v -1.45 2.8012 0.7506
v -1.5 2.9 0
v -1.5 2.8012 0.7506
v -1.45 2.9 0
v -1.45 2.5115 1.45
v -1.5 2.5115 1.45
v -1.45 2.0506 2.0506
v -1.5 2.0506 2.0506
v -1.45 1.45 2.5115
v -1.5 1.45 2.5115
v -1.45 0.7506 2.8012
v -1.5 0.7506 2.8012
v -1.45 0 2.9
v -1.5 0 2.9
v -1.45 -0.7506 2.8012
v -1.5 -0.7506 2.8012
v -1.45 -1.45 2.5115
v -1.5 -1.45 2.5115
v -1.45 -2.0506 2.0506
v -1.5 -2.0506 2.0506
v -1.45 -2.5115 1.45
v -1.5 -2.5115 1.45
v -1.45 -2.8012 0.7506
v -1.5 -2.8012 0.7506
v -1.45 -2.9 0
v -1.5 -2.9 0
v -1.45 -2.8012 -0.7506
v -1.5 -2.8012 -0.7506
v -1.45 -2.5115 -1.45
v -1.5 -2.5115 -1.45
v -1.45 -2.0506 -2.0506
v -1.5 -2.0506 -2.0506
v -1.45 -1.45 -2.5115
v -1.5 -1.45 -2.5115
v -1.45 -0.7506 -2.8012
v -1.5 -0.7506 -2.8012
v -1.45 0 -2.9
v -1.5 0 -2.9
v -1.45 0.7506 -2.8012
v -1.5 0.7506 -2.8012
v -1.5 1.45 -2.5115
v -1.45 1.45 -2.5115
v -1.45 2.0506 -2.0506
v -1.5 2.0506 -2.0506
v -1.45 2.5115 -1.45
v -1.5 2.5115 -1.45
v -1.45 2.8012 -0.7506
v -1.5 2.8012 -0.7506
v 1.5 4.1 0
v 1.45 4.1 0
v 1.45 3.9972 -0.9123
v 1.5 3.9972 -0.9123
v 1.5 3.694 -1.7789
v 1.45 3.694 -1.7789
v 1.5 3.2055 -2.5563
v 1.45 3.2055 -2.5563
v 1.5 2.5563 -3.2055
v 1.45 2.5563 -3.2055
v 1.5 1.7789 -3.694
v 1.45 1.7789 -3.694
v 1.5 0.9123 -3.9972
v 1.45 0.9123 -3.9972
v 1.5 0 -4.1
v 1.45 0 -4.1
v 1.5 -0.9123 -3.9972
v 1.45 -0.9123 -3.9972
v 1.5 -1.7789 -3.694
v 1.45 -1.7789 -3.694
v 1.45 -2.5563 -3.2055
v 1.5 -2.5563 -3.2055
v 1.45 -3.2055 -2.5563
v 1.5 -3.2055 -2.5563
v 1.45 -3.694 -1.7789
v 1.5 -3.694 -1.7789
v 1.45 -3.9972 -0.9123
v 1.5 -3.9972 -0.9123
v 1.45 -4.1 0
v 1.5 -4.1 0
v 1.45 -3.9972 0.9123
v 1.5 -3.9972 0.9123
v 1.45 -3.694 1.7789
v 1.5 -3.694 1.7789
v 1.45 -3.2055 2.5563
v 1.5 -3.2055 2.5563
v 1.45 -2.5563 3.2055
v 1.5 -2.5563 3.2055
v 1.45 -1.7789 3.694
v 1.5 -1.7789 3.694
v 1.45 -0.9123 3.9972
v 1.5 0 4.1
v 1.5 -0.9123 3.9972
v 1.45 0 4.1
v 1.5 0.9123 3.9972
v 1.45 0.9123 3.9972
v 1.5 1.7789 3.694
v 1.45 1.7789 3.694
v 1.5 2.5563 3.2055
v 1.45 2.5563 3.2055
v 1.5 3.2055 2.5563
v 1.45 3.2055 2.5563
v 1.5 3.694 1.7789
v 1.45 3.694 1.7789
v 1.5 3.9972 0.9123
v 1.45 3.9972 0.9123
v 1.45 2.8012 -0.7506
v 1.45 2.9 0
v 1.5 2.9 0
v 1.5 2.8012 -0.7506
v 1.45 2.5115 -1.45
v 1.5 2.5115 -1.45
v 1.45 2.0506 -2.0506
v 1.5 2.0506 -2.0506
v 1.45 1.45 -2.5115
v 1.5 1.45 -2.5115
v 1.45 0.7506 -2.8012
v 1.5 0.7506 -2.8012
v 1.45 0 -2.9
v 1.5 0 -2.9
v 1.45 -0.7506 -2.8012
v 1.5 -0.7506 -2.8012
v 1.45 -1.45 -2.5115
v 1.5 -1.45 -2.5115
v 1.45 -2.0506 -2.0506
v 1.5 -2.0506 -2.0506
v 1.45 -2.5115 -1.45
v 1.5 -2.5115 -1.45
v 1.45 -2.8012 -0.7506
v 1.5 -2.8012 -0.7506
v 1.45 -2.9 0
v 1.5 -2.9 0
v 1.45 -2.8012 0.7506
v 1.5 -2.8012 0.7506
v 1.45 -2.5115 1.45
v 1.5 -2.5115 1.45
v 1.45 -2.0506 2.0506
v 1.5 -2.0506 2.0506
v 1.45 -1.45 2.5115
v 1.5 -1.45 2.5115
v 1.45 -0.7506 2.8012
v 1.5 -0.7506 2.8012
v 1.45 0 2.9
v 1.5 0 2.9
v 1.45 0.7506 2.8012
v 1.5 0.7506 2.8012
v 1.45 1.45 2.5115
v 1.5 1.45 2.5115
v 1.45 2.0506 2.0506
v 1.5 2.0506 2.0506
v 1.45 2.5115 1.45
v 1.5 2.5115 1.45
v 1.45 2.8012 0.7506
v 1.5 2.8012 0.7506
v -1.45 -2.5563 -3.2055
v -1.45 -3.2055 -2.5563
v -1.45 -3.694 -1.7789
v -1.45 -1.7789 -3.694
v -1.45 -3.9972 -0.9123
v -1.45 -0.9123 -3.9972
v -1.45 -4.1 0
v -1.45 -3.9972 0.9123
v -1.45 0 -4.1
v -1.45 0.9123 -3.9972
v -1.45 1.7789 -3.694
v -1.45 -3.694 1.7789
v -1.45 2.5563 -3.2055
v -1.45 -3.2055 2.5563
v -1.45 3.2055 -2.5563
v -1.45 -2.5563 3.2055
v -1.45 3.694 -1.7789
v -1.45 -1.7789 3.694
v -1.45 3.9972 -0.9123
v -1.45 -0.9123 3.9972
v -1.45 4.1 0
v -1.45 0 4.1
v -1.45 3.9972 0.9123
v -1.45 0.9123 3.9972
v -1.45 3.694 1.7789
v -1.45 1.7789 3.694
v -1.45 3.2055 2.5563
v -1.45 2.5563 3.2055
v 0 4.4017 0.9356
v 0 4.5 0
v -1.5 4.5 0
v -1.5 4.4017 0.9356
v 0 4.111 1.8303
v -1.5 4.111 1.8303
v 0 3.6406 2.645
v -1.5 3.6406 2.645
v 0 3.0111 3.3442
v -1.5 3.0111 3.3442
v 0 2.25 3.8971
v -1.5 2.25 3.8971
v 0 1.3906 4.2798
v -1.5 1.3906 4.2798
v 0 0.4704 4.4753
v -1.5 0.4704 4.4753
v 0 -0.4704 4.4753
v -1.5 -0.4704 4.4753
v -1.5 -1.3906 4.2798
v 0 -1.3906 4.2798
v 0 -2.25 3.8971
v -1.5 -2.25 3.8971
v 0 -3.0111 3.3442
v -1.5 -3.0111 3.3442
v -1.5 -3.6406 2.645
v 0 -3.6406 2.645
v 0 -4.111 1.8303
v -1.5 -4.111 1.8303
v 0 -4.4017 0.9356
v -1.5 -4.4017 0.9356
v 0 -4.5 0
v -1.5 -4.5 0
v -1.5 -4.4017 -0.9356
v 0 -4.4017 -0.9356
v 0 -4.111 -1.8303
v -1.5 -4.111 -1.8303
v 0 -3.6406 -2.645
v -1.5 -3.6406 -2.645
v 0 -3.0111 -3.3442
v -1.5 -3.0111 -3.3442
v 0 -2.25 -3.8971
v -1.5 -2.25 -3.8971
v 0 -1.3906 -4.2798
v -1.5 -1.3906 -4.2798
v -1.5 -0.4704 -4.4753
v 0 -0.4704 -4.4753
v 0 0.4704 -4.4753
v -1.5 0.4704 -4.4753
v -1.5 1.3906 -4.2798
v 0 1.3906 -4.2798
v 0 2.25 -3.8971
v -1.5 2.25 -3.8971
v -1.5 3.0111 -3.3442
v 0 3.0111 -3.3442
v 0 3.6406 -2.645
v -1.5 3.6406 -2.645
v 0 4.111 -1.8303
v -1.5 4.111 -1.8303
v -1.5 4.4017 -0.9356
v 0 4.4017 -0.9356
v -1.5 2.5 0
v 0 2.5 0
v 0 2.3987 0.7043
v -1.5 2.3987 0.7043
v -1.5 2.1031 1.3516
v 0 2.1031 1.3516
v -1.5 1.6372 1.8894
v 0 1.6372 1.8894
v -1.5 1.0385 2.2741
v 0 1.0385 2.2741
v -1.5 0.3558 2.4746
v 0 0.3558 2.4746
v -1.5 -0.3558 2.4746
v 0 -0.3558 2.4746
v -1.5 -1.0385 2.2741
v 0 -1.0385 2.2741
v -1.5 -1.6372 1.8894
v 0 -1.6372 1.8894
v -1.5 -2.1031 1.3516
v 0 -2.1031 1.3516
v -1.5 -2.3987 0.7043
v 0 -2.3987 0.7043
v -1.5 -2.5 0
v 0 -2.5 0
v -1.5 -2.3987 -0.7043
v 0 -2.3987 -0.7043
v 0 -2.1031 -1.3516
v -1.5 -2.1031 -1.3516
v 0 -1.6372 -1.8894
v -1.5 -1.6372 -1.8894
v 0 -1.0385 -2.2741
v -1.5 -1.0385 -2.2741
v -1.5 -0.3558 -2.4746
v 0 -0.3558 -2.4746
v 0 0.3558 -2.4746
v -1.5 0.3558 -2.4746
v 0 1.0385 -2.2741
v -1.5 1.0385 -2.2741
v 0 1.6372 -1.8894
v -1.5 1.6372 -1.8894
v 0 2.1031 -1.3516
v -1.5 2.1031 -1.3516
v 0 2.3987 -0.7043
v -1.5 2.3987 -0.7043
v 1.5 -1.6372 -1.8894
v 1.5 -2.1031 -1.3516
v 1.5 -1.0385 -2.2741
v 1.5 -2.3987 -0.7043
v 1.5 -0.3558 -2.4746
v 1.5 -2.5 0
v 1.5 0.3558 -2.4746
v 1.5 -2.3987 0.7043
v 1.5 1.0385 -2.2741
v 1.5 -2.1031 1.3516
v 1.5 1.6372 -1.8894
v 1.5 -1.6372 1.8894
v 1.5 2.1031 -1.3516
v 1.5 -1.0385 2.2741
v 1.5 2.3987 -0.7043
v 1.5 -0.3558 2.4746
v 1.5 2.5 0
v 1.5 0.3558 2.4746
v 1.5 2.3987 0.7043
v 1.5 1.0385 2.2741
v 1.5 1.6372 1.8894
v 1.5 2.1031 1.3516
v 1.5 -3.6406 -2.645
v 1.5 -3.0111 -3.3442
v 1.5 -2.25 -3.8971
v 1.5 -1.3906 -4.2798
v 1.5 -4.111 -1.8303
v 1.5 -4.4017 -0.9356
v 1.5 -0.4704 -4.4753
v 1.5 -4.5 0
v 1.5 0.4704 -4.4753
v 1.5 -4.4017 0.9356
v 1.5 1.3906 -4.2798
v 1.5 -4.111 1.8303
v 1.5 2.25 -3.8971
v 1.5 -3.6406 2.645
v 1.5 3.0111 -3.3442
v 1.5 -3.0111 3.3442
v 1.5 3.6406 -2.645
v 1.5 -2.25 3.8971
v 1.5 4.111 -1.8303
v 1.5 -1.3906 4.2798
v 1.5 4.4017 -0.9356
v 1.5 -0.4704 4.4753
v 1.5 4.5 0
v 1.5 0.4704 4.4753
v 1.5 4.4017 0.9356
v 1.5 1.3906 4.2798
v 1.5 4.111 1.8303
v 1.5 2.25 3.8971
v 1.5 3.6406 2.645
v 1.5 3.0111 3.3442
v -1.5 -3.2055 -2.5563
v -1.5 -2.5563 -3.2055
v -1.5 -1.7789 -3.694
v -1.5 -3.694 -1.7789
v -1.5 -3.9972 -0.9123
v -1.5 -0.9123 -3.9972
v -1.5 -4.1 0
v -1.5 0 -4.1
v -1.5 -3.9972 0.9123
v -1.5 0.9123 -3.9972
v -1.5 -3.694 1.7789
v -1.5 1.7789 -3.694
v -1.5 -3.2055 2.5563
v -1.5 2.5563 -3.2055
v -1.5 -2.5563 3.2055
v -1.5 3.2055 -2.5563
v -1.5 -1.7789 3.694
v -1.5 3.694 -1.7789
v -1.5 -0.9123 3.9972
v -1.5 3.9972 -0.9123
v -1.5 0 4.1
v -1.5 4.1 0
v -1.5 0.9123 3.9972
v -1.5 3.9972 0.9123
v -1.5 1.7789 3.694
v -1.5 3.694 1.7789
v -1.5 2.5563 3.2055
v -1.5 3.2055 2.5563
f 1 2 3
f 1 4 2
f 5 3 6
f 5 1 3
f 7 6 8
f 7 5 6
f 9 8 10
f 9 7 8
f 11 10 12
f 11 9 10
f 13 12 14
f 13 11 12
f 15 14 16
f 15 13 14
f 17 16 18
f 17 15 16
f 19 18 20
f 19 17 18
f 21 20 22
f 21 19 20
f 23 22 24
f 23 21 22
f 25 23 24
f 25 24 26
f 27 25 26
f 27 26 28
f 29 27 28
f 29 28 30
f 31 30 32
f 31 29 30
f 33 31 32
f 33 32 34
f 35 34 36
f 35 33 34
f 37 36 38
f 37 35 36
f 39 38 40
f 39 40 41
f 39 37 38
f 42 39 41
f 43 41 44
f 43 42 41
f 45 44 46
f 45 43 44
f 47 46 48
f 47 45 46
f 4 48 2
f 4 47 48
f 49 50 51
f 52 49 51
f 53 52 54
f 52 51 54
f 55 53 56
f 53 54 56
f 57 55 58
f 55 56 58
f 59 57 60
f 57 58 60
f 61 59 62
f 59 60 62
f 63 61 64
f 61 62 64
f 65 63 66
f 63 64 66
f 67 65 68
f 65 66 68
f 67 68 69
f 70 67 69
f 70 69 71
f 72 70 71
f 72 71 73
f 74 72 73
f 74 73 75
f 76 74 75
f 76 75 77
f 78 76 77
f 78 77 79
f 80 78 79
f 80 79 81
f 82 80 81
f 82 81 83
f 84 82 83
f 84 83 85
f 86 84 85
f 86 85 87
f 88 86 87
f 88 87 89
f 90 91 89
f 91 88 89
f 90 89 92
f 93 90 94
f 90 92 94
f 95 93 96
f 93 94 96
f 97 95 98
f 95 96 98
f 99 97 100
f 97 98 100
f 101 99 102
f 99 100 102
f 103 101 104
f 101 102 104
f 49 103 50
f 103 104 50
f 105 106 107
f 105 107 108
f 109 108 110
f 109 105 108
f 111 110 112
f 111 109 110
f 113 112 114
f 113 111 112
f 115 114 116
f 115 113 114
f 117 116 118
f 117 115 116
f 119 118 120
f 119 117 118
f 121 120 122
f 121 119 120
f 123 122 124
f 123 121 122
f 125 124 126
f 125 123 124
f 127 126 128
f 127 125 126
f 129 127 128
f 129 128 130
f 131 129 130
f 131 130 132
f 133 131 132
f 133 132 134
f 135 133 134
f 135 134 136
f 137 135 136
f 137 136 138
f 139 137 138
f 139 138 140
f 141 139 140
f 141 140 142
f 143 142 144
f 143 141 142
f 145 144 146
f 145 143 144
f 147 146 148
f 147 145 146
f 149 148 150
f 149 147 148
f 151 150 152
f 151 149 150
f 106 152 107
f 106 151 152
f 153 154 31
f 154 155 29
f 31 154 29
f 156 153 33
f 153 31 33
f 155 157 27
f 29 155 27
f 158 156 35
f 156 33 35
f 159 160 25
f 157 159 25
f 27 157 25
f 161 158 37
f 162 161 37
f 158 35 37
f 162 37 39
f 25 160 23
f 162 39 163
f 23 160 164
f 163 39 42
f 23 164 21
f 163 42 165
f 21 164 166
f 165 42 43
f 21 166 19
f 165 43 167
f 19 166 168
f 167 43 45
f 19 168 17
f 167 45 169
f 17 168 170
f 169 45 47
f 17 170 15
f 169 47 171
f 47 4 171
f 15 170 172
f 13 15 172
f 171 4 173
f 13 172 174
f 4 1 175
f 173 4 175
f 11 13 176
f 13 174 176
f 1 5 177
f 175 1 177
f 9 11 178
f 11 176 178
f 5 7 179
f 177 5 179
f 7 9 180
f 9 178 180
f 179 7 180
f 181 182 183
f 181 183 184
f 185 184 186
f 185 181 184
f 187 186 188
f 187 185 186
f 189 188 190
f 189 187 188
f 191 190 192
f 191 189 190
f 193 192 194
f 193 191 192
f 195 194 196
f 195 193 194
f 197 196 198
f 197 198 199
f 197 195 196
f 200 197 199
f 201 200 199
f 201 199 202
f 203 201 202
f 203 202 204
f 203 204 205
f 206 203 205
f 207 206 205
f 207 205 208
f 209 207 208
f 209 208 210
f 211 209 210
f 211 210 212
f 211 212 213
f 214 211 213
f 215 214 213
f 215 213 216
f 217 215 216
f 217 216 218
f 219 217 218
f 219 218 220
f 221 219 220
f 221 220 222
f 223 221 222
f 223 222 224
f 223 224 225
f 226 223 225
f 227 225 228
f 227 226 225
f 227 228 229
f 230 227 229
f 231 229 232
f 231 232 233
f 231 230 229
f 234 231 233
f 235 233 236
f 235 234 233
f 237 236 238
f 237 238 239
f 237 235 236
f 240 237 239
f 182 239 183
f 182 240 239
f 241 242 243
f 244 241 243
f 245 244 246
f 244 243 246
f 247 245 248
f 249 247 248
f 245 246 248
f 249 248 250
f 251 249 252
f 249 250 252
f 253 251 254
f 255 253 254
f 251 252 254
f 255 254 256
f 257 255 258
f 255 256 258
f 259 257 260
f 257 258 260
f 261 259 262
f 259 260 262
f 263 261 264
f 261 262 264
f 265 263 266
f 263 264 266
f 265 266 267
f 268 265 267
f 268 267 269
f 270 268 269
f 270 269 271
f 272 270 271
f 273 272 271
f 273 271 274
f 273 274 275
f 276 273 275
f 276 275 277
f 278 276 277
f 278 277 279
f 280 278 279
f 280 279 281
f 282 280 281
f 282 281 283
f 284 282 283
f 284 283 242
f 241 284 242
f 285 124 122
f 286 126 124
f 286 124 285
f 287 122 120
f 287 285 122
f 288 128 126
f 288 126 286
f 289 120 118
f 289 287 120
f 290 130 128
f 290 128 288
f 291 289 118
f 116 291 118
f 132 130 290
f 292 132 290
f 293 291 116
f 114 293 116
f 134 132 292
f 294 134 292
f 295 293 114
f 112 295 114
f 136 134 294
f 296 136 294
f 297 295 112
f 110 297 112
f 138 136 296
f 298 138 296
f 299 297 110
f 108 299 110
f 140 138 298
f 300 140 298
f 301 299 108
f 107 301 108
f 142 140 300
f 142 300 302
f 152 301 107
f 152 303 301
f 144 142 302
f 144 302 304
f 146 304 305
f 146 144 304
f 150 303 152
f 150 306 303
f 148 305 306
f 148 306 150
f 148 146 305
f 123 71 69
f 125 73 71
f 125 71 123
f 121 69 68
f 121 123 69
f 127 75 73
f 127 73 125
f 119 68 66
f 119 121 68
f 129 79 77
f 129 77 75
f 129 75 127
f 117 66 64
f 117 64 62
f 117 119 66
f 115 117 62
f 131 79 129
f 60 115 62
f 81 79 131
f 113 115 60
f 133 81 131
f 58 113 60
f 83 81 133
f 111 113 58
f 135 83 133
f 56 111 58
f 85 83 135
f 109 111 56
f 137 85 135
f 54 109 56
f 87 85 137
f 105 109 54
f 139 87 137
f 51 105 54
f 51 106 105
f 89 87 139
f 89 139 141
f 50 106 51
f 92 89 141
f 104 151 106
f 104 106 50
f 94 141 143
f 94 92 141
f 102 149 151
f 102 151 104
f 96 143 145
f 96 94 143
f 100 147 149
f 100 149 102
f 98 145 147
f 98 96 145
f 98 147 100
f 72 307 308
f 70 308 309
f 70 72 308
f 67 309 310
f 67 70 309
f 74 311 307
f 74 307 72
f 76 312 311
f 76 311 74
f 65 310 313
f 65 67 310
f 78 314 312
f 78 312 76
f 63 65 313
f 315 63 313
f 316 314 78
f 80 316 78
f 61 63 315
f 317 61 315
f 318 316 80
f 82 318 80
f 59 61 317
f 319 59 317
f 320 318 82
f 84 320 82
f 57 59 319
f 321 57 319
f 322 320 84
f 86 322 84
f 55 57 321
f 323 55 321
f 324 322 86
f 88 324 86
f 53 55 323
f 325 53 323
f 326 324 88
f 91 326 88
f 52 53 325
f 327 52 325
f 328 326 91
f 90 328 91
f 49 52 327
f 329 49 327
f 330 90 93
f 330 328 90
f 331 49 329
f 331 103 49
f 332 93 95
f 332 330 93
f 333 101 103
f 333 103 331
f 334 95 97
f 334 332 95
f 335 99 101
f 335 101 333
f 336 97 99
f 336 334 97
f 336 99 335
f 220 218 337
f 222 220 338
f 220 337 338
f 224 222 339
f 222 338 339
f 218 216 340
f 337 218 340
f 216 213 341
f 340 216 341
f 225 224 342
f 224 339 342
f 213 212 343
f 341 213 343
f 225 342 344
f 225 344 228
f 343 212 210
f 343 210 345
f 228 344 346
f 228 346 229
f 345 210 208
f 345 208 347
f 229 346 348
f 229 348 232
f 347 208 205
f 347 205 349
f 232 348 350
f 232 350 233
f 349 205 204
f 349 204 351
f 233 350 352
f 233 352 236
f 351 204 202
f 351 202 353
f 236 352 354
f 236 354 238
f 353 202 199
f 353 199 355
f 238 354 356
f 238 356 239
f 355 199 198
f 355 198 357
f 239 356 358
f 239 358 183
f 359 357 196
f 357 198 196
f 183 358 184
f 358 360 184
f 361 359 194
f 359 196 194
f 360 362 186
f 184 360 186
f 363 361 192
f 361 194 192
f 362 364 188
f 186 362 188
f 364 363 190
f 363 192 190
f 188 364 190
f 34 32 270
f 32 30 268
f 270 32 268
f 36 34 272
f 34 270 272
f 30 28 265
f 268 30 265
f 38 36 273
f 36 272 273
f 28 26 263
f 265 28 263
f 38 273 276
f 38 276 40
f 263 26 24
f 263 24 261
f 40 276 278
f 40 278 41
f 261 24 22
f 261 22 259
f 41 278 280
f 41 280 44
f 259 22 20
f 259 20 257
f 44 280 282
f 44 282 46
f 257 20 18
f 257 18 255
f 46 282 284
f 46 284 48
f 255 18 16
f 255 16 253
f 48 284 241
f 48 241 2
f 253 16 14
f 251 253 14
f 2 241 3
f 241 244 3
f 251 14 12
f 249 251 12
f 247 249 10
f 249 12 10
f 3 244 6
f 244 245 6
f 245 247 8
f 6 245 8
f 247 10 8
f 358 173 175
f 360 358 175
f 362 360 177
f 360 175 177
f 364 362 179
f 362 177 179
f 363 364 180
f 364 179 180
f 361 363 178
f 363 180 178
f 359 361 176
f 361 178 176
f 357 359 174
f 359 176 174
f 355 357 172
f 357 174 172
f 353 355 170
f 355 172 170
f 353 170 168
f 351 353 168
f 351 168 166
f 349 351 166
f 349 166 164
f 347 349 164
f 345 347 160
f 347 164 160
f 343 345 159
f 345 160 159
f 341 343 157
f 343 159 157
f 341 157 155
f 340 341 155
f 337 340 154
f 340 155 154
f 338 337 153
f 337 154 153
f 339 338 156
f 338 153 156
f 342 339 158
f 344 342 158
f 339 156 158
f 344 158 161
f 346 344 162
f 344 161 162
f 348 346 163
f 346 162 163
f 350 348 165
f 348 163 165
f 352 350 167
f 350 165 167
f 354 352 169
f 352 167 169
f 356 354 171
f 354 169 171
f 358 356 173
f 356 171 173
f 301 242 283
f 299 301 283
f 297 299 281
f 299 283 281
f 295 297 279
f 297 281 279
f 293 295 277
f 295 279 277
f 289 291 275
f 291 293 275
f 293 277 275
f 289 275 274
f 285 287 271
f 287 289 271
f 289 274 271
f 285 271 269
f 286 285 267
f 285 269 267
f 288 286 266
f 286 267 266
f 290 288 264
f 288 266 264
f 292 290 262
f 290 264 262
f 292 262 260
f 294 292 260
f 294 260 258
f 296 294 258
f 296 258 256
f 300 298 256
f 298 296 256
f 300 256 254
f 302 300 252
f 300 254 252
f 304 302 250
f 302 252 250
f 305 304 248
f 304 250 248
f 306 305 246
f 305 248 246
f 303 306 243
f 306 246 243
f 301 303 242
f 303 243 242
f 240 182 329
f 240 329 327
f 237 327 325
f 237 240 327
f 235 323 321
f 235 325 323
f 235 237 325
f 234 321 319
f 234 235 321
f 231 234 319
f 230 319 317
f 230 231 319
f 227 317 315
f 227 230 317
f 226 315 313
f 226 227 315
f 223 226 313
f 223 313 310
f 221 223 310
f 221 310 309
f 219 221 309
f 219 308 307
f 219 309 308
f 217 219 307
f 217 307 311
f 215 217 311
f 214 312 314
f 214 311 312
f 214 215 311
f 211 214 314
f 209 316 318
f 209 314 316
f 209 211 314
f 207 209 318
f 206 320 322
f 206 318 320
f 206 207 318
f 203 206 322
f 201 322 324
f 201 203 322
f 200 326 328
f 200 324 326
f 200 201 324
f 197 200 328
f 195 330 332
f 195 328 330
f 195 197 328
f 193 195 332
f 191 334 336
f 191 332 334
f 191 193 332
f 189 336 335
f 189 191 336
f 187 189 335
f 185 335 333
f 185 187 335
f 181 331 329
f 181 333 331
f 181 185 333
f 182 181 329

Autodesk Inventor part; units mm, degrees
ref_plane "YZ Plane" through (0, 0, 0) normal (1, 0, 0) x (0, 1, 0)
ref_plane "XZ Plane" through (0, 0, 0) normal (0, 1, 0) x (-1, 0, 0)
ref_plane "XY Plane" through (0, 0, 0) normal (0, 0, 1) x (1, 0, 0)
sketch "Эскиз1" plane through (0, 0, 0) normal (1, 0, 0) x (0, 1, 0)
  circle A0 centre (0, 0) radius 2.5
  circle A1 centre (0, 0) radius 4.5
  circle A2 centre (0, 0) radius 2.9
  circle A3 centre (0, 0) radius 4.1
  dimension "d0" = 5
  dimension "d1" = 9
  dimension "d2" = 0.4
  dimension "d3" = 0.4
extrude "Выдавливание1" add sketch "Эскиз1" along normal mid plane 3
extrude "Выдавливание2" add sketch "Эскиз1" along normal mid plane 2.9 contours A3
properties part number "roller_5_9_3"
